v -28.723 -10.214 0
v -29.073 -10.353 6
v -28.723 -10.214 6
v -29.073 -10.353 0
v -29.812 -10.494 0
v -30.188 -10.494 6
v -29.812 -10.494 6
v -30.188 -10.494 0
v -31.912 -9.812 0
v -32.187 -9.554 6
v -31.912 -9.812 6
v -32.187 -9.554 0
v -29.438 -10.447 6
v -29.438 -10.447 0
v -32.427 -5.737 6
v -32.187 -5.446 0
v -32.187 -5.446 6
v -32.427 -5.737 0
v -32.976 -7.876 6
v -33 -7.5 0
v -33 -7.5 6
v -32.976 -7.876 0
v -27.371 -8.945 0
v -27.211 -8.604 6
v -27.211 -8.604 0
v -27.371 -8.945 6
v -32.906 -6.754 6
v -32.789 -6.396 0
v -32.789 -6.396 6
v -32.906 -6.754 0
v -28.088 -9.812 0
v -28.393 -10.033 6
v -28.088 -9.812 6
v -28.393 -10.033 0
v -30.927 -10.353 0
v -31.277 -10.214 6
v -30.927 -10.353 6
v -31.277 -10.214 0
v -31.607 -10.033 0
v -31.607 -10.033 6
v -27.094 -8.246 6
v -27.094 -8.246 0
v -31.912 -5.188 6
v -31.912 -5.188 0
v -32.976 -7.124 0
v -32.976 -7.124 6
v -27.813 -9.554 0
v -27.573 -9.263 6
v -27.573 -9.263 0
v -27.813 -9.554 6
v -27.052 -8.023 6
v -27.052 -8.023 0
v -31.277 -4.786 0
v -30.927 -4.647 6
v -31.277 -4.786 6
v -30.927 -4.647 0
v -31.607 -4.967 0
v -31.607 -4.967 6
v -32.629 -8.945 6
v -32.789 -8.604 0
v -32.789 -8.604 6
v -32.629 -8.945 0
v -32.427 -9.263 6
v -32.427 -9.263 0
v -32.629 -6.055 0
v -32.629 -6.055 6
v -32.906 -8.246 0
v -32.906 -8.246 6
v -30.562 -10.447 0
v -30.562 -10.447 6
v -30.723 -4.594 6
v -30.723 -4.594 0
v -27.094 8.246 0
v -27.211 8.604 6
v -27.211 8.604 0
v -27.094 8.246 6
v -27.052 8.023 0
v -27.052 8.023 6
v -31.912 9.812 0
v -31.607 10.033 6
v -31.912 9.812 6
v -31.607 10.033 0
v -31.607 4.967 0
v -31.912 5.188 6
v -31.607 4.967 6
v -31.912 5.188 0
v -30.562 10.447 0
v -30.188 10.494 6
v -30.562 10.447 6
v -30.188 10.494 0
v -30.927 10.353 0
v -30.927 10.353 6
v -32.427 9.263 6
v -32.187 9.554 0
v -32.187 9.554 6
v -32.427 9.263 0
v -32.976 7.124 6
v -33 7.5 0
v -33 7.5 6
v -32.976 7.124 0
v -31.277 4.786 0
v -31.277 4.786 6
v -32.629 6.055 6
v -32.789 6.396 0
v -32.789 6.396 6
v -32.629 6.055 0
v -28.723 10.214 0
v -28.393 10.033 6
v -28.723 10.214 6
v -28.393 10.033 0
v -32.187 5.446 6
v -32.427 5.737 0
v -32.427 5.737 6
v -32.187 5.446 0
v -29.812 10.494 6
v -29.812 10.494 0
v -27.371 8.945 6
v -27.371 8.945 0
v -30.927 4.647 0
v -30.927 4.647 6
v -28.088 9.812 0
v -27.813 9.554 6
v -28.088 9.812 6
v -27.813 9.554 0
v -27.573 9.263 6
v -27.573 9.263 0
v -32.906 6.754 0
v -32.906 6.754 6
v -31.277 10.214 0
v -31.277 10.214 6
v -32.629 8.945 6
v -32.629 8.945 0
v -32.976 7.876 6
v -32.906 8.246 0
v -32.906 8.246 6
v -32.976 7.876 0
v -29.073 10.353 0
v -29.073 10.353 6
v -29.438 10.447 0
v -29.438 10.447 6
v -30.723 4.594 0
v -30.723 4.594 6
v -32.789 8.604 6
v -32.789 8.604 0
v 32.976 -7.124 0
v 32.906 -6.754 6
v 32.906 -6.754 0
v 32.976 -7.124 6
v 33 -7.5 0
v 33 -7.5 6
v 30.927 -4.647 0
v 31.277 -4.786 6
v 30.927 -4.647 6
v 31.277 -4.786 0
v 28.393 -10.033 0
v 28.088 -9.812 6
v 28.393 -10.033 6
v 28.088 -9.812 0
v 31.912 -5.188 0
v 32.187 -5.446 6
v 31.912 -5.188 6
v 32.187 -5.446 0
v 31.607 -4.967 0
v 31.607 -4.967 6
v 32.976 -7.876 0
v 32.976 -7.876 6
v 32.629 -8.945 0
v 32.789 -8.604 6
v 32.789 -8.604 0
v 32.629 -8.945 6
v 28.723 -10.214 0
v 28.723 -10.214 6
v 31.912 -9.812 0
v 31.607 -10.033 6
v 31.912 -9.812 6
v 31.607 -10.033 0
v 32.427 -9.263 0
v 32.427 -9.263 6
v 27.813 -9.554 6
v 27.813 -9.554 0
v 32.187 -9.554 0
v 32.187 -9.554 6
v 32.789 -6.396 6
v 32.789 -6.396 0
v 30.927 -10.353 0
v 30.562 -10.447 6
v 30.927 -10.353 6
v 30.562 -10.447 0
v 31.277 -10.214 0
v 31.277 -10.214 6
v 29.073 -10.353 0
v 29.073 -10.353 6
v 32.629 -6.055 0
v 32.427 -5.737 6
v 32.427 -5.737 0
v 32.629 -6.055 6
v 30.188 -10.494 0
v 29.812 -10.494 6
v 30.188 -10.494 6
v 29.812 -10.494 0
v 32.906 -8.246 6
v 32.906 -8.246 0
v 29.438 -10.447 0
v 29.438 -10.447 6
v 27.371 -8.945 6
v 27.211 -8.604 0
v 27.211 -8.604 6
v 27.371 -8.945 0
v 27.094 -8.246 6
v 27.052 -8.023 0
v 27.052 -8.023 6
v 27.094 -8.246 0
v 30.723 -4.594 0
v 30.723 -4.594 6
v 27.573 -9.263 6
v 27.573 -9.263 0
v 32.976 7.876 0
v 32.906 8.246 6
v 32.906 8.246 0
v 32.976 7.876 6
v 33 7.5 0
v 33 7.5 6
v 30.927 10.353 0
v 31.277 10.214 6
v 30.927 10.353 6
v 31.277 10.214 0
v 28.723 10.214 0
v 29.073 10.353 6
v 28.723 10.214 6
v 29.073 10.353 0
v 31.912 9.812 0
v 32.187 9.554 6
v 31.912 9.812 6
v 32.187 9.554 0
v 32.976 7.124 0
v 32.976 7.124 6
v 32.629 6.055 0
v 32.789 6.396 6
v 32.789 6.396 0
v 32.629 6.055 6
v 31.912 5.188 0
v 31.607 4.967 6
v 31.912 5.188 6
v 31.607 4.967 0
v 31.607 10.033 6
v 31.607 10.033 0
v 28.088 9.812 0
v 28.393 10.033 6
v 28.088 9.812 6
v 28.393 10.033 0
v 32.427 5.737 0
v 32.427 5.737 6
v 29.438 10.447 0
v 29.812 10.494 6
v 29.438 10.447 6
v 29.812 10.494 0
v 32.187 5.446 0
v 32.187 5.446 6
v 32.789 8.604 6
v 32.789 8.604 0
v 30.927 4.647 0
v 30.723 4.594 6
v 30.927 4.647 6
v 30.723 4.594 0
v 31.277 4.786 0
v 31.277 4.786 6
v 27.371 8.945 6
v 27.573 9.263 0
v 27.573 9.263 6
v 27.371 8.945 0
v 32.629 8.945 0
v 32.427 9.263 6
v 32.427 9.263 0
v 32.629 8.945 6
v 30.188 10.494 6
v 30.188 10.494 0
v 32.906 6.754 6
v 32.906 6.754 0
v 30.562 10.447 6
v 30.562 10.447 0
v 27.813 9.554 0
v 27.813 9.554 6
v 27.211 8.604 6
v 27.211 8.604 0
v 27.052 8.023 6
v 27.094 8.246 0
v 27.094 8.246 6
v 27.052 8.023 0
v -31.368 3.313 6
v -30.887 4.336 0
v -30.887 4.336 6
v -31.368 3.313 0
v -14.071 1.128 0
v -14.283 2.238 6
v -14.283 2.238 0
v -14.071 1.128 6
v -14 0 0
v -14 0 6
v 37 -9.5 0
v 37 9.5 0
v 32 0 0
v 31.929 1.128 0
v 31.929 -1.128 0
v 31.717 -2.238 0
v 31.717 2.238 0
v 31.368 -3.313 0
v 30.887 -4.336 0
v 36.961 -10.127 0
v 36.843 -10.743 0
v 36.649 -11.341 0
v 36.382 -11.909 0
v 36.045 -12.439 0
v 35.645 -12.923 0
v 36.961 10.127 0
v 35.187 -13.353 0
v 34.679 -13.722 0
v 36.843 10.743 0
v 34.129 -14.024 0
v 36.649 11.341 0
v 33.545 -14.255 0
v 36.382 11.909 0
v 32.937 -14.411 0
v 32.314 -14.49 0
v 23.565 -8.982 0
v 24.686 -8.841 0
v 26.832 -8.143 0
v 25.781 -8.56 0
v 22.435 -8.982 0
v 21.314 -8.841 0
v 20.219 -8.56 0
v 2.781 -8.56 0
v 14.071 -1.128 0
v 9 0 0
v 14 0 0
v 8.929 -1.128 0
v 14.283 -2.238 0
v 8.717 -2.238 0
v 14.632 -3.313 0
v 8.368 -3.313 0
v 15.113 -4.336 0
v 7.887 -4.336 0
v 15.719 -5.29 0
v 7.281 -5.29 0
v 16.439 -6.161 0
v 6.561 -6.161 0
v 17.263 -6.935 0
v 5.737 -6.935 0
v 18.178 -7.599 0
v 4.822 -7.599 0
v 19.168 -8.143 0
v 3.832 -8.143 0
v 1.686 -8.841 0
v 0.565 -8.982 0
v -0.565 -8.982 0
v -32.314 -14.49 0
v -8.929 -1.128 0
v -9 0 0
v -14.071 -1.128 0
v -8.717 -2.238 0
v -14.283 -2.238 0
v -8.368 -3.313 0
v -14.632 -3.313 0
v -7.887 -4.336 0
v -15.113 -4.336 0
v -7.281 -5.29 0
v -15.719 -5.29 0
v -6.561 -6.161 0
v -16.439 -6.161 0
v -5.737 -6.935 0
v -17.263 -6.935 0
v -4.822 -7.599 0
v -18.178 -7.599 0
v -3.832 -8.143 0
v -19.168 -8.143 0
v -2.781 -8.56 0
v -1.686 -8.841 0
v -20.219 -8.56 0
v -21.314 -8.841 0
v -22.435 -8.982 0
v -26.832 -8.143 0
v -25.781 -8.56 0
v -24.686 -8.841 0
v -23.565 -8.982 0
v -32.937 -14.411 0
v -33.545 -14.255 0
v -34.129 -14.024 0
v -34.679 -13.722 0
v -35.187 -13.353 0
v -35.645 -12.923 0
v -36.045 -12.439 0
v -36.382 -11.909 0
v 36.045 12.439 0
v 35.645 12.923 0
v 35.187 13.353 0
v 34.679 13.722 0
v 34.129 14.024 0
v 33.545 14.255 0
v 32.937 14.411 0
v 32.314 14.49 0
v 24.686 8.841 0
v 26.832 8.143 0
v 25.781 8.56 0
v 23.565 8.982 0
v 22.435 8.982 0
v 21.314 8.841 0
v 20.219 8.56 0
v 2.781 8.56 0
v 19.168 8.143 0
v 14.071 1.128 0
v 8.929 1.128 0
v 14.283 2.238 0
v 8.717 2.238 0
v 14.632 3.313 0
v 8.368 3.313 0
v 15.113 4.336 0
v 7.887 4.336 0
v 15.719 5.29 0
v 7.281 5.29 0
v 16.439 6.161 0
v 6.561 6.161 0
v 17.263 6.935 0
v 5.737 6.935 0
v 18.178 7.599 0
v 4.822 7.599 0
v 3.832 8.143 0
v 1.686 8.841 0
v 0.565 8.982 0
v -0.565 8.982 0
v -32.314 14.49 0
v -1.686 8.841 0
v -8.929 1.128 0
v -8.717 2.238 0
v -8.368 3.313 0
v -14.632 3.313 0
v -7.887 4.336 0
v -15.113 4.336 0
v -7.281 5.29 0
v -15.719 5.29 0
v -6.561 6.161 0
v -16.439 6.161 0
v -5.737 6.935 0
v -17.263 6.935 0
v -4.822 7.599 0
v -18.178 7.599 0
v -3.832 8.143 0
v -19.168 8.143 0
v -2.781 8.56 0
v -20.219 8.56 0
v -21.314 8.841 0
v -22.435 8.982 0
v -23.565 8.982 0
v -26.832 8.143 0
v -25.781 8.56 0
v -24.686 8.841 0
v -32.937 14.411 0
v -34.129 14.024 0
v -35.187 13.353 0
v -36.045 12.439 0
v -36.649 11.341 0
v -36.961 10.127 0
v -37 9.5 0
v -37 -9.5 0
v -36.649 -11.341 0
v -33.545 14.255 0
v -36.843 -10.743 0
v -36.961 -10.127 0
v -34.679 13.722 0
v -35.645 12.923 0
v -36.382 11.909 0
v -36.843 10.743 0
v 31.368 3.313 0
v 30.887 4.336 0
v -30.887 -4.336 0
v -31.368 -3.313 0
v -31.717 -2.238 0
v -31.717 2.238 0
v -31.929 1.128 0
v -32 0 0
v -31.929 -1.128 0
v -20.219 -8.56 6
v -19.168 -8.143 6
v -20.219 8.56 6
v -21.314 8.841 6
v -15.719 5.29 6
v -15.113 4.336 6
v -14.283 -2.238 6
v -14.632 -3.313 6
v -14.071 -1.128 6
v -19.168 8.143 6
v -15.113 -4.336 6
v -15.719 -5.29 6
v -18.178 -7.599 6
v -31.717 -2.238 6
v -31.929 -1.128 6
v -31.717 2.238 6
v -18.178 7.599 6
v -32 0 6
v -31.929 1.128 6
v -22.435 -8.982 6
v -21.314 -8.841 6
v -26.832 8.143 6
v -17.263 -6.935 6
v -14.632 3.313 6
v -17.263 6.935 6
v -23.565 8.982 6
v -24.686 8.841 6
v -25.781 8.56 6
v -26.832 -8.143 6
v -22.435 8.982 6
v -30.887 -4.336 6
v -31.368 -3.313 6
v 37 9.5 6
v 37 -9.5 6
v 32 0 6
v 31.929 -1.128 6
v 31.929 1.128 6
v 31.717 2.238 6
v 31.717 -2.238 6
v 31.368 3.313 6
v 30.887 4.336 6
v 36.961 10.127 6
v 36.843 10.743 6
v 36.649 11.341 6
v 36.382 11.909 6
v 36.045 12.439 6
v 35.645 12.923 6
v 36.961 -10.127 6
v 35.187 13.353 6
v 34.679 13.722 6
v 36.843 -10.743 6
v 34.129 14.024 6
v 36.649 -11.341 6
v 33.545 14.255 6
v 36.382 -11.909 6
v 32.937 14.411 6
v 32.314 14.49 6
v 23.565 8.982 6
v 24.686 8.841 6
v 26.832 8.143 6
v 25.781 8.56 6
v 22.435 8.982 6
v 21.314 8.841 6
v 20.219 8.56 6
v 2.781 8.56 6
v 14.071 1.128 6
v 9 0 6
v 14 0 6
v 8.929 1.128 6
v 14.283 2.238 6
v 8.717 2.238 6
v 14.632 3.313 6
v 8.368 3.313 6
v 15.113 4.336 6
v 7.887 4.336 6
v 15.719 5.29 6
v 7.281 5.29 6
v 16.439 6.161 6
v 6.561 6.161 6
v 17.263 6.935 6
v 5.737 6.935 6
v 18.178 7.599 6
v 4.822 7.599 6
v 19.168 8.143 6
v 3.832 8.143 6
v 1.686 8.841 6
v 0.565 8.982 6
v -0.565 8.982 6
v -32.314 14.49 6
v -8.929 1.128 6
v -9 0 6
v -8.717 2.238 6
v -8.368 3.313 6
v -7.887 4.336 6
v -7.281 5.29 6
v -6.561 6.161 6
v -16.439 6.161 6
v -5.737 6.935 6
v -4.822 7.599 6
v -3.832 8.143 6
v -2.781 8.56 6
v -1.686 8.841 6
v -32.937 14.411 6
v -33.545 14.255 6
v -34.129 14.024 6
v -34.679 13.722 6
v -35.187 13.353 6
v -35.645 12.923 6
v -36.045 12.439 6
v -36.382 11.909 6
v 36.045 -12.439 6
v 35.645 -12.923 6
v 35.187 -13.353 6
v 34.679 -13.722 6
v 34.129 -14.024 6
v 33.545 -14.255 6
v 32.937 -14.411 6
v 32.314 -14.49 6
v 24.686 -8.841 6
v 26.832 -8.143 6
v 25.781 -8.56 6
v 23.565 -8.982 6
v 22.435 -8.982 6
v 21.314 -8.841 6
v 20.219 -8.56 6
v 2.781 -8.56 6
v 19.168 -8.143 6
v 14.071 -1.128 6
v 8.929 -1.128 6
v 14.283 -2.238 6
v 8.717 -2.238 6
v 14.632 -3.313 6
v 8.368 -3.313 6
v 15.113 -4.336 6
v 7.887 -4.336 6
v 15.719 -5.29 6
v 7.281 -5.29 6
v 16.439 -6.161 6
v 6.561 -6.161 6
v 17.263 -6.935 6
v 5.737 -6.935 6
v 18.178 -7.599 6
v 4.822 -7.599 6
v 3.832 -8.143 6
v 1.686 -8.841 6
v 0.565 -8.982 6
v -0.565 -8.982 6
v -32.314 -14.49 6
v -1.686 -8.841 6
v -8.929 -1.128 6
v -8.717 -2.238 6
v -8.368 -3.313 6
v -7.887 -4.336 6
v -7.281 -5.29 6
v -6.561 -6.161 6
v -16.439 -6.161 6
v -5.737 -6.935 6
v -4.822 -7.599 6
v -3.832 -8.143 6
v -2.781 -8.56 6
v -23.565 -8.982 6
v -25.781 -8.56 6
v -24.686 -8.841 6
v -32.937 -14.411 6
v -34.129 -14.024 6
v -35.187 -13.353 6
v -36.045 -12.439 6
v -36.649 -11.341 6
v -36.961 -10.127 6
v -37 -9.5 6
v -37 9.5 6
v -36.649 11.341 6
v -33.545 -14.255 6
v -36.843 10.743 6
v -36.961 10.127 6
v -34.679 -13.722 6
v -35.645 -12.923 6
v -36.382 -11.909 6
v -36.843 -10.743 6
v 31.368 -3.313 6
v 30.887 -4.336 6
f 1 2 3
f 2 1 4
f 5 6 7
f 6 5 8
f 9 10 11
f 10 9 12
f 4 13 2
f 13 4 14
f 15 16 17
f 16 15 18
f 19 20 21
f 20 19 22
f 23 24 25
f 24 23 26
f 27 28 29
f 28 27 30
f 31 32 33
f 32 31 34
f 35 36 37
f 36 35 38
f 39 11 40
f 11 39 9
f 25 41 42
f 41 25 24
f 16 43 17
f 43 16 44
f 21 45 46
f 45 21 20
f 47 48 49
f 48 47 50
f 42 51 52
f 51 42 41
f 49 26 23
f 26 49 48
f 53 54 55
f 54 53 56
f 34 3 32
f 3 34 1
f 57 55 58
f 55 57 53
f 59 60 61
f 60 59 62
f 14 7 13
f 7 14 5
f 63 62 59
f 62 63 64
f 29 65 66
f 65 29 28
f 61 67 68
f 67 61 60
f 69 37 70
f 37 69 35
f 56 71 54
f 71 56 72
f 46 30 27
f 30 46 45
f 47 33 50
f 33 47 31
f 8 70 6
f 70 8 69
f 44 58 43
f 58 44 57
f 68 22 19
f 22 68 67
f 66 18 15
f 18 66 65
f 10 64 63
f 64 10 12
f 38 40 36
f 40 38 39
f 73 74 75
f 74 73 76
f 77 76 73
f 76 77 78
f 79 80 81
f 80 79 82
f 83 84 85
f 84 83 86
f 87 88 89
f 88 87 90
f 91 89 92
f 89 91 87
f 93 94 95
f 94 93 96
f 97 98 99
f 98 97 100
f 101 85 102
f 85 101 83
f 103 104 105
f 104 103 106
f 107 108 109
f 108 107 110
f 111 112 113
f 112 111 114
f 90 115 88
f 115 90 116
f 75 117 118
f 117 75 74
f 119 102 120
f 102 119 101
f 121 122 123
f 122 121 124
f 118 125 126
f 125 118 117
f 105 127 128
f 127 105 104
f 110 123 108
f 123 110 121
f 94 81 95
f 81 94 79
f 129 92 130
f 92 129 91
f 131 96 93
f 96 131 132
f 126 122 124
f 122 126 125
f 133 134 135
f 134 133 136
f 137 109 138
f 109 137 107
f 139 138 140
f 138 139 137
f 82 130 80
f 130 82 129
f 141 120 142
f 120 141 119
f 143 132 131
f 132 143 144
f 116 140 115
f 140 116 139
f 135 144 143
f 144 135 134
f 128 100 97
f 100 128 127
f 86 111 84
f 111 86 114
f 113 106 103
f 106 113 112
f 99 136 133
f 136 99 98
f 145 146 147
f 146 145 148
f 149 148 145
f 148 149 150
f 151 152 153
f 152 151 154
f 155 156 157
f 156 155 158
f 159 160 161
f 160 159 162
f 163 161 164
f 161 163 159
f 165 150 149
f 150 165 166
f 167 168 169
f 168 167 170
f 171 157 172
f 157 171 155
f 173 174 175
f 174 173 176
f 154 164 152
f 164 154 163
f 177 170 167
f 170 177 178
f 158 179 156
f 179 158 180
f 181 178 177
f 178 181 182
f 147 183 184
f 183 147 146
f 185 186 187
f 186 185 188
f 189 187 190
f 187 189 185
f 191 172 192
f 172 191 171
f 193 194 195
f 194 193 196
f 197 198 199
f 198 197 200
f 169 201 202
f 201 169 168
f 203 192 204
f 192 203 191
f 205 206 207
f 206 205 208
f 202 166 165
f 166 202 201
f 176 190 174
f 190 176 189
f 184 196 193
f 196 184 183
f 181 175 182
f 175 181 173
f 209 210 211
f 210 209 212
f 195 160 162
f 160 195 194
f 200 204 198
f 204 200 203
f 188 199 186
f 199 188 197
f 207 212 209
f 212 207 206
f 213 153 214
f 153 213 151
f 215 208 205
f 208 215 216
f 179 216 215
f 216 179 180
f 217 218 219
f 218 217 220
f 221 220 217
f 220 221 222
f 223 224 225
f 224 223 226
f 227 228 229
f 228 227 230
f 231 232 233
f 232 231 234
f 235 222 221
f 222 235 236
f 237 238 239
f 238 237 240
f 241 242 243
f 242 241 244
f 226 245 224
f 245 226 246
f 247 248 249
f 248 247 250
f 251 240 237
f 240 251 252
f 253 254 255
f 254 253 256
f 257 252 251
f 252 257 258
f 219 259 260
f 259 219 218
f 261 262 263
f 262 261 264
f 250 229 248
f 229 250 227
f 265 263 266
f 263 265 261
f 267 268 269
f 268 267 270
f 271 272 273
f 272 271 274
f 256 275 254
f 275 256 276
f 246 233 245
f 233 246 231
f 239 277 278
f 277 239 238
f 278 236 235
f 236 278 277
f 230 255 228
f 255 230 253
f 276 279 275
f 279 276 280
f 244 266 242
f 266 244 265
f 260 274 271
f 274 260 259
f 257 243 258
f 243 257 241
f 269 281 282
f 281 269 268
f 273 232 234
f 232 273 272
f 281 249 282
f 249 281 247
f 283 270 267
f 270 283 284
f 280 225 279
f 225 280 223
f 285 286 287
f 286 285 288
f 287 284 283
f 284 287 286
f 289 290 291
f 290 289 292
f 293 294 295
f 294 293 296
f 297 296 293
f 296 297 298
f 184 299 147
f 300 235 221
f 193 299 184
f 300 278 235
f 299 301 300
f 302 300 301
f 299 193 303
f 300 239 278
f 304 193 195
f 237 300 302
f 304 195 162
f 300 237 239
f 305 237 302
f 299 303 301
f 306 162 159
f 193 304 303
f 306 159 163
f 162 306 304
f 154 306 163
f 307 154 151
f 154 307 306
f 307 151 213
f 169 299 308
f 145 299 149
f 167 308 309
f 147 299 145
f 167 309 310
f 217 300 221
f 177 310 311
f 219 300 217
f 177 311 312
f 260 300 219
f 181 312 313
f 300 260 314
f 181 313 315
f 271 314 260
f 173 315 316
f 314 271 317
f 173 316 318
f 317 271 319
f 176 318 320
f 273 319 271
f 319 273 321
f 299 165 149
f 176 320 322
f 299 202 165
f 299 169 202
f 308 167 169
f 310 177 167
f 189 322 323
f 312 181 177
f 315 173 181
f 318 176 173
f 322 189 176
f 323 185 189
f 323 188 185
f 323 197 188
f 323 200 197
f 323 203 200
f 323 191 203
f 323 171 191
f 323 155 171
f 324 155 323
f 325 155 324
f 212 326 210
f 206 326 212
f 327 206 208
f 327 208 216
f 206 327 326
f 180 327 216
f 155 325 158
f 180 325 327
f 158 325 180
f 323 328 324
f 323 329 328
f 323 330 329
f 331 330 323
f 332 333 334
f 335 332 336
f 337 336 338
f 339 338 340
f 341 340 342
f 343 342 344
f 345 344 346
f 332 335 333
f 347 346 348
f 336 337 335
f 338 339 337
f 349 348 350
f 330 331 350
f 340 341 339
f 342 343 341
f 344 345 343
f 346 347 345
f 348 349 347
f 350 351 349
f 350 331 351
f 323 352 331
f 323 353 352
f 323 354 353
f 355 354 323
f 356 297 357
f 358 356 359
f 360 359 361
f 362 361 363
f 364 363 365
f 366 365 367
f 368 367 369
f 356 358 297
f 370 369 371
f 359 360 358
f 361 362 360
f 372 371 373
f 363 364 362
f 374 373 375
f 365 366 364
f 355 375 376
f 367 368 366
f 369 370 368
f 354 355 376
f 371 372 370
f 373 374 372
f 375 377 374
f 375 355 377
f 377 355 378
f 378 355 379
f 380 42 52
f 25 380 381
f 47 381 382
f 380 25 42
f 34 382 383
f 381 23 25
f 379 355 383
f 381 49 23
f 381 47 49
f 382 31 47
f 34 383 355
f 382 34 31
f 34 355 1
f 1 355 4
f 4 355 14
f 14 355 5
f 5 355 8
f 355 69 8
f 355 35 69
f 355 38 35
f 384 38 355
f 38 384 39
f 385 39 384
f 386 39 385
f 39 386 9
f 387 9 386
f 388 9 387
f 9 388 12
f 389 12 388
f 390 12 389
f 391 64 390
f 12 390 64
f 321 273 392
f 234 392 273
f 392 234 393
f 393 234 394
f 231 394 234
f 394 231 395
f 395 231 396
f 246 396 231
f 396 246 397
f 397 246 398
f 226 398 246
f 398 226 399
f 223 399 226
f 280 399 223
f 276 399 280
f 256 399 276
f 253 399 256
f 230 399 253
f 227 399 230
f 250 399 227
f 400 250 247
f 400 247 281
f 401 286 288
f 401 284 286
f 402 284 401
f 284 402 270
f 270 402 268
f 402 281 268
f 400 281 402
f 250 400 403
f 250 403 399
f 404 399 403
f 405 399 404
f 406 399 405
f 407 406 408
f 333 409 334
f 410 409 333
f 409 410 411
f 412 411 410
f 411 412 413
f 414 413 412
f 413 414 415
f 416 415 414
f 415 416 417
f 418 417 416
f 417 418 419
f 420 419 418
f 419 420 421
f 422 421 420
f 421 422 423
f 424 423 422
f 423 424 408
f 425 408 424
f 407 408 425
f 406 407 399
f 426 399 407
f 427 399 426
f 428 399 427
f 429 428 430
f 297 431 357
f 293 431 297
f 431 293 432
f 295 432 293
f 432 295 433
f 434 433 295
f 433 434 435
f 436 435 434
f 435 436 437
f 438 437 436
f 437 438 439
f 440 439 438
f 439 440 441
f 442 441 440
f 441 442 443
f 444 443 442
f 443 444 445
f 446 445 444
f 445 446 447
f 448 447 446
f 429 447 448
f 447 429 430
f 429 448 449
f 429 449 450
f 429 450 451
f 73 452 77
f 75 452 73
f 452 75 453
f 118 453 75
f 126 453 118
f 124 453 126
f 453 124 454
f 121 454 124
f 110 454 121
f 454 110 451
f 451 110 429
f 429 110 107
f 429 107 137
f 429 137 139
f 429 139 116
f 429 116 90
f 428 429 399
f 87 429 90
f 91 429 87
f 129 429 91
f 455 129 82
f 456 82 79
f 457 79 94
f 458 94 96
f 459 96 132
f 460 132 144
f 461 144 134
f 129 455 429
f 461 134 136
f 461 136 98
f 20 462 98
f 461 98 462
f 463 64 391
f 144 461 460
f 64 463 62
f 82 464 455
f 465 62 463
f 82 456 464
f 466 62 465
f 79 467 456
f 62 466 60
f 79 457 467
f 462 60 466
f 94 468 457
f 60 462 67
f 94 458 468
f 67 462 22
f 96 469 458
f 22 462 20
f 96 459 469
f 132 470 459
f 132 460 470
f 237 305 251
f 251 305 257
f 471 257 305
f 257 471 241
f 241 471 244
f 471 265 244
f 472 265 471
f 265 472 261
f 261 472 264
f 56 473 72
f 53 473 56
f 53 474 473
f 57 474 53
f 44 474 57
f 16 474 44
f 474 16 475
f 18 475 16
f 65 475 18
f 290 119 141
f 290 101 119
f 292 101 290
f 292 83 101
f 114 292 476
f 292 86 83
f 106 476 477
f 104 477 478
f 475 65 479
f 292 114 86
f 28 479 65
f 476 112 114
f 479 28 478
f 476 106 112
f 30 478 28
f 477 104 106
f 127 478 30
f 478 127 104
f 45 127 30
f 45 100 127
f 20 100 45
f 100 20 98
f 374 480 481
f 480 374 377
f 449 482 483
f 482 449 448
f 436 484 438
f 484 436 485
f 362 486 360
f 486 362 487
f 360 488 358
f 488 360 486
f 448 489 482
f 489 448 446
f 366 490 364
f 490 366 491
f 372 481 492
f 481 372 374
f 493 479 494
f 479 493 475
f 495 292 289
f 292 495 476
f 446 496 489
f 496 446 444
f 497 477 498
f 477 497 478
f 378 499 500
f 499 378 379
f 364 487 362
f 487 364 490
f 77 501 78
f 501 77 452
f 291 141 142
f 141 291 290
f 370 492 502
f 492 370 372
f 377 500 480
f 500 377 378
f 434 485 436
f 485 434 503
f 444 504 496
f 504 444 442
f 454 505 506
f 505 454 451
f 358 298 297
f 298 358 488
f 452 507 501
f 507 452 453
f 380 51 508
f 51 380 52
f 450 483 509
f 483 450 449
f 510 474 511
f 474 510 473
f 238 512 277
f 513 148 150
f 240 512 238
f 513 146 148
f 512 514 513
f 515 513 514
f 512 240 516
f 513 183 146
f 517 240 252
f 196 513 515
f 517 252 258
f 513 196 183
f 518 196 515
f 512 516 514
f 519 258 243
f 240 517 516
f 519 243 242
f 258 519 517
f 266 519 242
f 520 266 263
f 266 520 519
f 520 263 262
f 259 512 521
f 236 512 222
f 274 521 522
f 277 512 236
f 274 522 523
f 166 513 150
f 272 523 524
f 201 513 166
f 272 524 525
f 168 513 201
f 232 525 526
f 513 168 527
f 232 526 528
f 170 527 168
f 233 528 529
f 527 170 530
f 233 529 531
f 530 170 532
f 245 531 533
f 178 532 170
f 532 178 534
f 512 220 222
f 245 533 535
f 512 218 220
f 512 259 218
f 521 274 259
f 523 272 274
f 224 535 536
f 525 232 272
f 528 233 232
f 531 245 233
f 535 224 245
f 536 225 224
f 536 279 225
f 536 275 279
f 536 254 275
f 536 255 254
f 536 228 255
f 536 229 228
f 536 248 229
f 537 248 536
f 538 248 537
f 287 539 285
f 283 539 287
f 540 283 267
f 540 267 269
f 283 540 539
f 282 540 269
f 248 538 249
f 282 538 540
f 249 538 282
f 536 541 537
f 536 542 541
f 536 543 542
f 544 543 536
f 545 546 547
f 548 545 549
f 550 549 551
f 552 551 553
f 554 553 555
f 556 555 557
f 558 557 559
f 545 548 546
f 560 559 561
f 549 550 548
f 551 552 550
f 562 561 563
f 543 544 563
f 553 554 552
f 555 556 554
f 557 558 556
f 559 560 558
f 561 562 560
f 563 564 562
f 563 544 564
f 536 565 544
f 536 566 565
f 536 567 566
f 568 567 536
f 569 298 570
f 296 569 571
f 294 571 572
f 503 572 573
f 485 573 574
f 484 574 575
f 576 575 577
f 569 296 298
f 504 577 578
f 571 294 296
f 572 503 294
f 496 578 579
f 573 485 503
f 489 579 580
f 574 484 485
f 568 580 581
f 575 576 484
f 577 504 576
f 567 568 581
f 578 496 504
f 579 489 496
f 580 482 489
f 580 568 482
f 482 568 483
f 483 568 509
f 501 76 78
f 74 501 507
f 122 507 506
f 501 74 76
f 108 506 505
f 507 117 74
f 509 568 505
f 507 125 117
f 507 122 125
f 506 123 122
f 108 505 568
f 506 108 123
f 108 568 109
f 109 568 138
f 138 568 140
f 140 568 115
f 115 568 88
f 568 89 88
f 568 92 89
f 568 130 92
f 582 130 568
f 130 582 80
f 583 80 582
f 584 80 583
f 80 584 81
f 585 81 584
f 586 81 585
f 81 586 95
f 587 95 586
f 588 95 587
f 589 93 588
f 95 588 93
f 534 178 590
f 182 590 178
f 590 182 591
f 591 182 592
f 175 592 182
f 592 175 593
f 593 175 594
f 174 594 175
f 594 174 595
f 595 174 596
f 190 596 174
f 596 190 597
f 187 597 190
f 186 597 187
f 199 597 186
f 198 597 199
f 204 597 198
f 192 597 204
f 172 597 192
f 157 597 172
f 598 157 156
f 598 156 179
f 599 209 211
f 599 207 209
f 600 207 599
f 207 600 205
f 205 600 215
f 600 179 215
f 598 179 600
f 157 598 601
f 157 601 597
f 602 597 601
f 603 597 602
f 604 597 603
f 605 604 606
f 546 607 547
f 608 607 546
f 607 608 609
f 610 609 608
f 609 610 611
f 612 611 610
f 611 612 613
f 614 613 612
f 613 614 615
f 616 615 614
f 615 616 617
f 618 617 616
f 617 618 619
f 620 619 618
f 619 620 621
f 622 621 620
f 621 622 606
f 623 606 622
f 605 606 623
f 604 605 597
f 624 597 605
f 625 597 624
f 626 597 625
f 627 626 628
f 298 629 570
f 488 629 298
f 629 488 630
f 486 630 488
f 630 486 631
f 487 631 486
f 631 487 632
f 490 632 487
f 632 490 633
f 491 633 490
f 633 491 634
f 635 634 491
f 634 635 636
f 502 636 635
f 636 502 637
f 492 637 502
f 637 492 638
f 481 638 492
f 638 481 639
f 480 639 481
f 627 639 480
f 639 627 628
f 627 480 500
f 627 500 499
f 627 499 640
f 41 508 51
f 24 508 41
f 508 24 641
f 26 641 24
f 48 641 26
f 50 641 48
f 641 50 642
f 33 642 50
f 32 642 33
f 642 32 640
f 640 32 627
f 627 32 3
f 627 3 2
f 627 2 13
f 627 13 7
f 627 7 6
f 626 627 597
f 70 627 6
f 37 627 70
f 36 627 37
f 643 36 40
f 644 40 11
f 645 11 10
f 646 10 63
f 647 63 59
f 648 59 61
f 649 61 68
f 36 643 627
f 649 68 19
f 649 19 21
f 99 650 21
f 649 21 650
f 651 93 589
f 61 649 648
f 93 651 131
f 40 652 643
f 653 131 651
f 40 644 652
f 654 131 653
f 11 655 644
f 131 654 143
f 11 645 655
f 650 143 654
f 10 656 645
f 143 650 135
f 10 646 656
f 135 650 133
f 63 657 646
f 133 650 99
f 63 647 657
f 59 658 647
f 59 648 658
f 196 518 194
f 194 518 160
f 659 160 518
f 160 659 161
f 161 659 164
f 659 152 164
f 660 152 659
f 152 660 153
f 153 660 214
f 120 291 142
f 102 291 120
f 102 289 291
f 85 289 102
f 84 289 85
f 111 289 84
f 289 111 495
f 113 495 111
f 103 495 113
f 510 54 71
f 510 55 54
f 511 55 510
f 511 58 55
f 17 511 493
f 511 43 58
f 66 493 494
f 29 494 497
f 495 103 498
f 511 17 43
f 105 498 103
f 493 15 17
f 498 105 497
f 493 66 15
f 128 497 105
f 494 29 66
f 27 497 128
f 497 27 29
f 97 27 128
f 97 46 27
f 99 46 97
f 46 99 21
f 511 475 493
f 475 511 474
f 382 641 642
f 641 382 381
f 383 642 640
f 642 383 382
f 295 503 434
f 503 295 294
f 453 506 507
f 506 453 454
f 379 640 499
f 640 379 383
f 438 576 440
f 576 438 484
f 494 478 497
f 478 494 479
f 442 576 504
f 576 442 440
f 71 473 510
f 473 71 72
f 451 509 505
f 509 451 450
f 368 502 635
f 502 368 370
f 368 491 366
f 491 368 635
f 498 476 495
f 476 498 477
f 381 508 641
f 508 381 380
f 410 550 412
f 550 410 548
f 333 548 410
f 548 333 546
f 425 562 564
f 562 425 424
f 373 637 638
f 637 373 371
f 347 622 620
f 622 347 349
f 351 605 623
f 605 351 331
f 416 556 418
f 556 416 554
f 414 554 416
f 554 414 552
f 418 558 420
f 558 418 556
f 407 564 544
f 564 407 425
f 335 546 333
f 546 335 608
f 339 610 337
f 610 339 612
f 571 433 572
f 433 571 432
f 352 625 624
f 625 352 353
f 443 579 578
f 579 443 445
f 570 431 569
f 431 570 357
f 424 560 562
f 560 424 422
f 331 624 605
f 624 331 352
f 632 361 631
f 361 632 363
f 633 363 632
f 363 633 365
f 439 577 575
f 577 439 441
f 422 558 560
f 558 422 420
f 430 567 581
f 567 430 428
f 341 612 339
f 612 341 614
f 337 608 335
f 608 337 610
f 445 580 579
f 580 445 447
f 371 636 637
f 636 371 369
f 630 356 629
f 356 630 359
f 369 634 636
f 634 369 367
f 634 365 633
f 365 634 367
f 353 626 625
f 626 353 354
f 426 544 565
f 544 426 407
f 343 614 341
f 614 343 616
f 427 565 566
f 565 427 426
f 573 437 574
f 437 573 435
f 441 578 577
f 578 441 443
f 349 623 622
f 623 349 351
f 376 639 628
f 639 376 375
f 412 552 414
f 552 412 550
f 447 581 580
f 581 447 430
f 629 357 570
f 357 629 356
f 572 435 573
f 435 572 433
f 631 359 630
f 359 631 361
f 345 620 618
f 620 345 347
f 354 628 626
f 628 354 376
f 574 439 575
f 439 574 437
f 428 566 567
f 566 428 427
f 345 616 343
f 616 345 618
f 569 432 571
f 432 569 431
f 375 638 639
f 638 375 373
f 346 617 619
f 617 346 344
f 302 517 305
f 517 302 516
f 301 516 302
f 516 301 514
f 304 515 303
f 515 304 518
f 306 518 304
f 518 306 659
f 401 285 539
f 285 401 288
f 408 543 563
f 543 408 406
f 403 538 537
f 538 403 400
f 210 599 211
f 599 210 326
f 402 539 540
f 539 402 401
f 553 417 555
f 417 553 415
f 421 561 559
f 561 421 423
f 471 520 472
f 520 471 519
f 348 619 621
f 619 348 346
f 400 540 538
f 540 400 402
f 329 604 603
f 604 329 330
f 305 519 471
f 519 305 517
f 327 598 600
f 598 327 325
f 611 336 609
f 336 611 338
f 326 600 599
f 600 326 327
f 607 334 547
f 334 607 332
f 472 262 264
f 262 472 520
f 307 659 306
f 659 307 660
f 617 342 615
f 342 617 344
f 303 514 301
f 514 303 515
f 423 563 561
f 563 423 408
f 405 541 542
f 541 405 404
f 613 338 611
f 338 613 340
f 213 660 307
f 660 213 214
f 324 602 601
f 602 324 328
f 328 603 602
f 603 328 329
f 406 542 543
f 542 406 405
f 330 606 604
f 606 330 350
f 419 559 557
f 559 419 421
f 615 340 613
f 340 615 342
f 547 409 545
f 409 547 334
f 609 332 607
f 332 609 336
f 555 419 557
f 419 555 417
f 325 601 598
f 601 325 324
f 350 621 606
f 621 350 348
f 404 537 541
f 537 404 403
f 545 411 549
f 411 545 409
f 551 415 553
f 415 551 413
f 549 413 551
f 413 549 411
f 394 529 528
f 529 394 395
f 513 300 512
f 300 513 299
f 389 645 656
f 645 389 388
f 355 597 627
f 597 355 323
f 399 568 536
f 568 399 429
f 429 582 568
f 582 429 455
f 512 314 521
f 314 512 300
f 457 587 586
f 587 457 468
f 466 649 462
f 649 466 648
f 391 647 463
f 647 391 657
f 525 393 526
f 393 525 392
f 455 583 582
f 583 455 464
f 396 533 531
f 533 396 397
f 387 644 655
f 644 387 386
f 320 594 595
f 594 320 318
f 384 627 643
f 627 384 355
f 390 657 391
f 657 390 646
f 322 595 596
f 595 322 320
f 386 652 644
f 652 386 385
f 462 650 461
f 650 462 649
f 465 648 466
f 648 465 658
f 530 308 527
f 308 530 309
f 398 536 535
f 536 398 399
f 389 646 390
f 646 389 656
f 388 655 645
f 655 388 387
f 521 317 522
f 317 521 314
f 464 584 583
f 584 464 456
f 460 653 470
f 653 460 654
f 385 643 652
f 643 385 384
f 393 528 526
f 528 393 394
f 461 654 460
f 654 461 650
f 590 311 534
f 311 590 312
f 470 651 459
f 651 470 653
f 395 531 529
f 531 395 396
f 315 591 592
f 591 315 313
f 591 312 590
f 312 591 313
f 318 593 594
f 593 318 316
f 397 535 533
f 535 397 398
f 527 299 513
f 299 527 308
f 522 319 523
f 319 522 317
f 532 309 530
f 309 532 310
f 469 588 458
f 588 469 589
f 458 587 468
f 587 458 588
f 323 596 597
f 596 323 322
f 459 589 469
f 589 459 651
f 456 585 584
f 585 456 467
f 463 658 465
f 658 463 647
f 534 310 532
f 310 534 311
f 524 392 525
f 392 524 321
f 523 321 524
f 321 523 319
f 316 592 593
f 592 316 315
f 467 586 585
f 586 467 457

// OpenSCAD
$fn = 50;


difference() {
	union() {
		hull() {
			translate(v = [-32.0000000000, 9.5000000000, 0]) {
				cylinder(h = 6, r = 5);
			}
			translate(v = [32.0000000000, 9.5000000000, 0]) {
				cylinder(h = 6, r = 5);
			}
			translate(v = [-32.0000000000, -9.5000000000, 0]) {
				cylinder(h = 6, r = 5);
			}
			translate(v = [32.0000000000, -9.5000000000, 0]) {
				cylinder(h = 6, r = 5);
			}
		}
	}
	union() {
		#translate(v = [-30.0000000000, -7.5000000000, -100.0000000000]) {
			cylinder(h = 200, r = 3.0000000000);
		}
		#translate(v = [-30.0000000000, 7.5000000000, -100.0000000000]) {
			cylinder(h = 200, r = 3.0000000000);
		}
		#translate(v = [30.0000000000, -7.5000000000, -100.0000000000]) {
			cylinder(h = 200, r = 3.0000000000);
		}
		#translate(v = [30.0000000000, 7.5000000000, -100.0000000000]) {
			cylinder(h = 200, r = 3.0000000000);
		}
		#translate(v = [-23.0000000000, 0, 0]) {
			cylinder(h = 6, r = 9.0000000000);
		}
		#cylinder(h = 6, r = 9.0000000000);
		#translate(v = [23.0000000000, 0, 0]) {
			cylinder(h = 6, r = 9.0000000000);
		}
	}
}
